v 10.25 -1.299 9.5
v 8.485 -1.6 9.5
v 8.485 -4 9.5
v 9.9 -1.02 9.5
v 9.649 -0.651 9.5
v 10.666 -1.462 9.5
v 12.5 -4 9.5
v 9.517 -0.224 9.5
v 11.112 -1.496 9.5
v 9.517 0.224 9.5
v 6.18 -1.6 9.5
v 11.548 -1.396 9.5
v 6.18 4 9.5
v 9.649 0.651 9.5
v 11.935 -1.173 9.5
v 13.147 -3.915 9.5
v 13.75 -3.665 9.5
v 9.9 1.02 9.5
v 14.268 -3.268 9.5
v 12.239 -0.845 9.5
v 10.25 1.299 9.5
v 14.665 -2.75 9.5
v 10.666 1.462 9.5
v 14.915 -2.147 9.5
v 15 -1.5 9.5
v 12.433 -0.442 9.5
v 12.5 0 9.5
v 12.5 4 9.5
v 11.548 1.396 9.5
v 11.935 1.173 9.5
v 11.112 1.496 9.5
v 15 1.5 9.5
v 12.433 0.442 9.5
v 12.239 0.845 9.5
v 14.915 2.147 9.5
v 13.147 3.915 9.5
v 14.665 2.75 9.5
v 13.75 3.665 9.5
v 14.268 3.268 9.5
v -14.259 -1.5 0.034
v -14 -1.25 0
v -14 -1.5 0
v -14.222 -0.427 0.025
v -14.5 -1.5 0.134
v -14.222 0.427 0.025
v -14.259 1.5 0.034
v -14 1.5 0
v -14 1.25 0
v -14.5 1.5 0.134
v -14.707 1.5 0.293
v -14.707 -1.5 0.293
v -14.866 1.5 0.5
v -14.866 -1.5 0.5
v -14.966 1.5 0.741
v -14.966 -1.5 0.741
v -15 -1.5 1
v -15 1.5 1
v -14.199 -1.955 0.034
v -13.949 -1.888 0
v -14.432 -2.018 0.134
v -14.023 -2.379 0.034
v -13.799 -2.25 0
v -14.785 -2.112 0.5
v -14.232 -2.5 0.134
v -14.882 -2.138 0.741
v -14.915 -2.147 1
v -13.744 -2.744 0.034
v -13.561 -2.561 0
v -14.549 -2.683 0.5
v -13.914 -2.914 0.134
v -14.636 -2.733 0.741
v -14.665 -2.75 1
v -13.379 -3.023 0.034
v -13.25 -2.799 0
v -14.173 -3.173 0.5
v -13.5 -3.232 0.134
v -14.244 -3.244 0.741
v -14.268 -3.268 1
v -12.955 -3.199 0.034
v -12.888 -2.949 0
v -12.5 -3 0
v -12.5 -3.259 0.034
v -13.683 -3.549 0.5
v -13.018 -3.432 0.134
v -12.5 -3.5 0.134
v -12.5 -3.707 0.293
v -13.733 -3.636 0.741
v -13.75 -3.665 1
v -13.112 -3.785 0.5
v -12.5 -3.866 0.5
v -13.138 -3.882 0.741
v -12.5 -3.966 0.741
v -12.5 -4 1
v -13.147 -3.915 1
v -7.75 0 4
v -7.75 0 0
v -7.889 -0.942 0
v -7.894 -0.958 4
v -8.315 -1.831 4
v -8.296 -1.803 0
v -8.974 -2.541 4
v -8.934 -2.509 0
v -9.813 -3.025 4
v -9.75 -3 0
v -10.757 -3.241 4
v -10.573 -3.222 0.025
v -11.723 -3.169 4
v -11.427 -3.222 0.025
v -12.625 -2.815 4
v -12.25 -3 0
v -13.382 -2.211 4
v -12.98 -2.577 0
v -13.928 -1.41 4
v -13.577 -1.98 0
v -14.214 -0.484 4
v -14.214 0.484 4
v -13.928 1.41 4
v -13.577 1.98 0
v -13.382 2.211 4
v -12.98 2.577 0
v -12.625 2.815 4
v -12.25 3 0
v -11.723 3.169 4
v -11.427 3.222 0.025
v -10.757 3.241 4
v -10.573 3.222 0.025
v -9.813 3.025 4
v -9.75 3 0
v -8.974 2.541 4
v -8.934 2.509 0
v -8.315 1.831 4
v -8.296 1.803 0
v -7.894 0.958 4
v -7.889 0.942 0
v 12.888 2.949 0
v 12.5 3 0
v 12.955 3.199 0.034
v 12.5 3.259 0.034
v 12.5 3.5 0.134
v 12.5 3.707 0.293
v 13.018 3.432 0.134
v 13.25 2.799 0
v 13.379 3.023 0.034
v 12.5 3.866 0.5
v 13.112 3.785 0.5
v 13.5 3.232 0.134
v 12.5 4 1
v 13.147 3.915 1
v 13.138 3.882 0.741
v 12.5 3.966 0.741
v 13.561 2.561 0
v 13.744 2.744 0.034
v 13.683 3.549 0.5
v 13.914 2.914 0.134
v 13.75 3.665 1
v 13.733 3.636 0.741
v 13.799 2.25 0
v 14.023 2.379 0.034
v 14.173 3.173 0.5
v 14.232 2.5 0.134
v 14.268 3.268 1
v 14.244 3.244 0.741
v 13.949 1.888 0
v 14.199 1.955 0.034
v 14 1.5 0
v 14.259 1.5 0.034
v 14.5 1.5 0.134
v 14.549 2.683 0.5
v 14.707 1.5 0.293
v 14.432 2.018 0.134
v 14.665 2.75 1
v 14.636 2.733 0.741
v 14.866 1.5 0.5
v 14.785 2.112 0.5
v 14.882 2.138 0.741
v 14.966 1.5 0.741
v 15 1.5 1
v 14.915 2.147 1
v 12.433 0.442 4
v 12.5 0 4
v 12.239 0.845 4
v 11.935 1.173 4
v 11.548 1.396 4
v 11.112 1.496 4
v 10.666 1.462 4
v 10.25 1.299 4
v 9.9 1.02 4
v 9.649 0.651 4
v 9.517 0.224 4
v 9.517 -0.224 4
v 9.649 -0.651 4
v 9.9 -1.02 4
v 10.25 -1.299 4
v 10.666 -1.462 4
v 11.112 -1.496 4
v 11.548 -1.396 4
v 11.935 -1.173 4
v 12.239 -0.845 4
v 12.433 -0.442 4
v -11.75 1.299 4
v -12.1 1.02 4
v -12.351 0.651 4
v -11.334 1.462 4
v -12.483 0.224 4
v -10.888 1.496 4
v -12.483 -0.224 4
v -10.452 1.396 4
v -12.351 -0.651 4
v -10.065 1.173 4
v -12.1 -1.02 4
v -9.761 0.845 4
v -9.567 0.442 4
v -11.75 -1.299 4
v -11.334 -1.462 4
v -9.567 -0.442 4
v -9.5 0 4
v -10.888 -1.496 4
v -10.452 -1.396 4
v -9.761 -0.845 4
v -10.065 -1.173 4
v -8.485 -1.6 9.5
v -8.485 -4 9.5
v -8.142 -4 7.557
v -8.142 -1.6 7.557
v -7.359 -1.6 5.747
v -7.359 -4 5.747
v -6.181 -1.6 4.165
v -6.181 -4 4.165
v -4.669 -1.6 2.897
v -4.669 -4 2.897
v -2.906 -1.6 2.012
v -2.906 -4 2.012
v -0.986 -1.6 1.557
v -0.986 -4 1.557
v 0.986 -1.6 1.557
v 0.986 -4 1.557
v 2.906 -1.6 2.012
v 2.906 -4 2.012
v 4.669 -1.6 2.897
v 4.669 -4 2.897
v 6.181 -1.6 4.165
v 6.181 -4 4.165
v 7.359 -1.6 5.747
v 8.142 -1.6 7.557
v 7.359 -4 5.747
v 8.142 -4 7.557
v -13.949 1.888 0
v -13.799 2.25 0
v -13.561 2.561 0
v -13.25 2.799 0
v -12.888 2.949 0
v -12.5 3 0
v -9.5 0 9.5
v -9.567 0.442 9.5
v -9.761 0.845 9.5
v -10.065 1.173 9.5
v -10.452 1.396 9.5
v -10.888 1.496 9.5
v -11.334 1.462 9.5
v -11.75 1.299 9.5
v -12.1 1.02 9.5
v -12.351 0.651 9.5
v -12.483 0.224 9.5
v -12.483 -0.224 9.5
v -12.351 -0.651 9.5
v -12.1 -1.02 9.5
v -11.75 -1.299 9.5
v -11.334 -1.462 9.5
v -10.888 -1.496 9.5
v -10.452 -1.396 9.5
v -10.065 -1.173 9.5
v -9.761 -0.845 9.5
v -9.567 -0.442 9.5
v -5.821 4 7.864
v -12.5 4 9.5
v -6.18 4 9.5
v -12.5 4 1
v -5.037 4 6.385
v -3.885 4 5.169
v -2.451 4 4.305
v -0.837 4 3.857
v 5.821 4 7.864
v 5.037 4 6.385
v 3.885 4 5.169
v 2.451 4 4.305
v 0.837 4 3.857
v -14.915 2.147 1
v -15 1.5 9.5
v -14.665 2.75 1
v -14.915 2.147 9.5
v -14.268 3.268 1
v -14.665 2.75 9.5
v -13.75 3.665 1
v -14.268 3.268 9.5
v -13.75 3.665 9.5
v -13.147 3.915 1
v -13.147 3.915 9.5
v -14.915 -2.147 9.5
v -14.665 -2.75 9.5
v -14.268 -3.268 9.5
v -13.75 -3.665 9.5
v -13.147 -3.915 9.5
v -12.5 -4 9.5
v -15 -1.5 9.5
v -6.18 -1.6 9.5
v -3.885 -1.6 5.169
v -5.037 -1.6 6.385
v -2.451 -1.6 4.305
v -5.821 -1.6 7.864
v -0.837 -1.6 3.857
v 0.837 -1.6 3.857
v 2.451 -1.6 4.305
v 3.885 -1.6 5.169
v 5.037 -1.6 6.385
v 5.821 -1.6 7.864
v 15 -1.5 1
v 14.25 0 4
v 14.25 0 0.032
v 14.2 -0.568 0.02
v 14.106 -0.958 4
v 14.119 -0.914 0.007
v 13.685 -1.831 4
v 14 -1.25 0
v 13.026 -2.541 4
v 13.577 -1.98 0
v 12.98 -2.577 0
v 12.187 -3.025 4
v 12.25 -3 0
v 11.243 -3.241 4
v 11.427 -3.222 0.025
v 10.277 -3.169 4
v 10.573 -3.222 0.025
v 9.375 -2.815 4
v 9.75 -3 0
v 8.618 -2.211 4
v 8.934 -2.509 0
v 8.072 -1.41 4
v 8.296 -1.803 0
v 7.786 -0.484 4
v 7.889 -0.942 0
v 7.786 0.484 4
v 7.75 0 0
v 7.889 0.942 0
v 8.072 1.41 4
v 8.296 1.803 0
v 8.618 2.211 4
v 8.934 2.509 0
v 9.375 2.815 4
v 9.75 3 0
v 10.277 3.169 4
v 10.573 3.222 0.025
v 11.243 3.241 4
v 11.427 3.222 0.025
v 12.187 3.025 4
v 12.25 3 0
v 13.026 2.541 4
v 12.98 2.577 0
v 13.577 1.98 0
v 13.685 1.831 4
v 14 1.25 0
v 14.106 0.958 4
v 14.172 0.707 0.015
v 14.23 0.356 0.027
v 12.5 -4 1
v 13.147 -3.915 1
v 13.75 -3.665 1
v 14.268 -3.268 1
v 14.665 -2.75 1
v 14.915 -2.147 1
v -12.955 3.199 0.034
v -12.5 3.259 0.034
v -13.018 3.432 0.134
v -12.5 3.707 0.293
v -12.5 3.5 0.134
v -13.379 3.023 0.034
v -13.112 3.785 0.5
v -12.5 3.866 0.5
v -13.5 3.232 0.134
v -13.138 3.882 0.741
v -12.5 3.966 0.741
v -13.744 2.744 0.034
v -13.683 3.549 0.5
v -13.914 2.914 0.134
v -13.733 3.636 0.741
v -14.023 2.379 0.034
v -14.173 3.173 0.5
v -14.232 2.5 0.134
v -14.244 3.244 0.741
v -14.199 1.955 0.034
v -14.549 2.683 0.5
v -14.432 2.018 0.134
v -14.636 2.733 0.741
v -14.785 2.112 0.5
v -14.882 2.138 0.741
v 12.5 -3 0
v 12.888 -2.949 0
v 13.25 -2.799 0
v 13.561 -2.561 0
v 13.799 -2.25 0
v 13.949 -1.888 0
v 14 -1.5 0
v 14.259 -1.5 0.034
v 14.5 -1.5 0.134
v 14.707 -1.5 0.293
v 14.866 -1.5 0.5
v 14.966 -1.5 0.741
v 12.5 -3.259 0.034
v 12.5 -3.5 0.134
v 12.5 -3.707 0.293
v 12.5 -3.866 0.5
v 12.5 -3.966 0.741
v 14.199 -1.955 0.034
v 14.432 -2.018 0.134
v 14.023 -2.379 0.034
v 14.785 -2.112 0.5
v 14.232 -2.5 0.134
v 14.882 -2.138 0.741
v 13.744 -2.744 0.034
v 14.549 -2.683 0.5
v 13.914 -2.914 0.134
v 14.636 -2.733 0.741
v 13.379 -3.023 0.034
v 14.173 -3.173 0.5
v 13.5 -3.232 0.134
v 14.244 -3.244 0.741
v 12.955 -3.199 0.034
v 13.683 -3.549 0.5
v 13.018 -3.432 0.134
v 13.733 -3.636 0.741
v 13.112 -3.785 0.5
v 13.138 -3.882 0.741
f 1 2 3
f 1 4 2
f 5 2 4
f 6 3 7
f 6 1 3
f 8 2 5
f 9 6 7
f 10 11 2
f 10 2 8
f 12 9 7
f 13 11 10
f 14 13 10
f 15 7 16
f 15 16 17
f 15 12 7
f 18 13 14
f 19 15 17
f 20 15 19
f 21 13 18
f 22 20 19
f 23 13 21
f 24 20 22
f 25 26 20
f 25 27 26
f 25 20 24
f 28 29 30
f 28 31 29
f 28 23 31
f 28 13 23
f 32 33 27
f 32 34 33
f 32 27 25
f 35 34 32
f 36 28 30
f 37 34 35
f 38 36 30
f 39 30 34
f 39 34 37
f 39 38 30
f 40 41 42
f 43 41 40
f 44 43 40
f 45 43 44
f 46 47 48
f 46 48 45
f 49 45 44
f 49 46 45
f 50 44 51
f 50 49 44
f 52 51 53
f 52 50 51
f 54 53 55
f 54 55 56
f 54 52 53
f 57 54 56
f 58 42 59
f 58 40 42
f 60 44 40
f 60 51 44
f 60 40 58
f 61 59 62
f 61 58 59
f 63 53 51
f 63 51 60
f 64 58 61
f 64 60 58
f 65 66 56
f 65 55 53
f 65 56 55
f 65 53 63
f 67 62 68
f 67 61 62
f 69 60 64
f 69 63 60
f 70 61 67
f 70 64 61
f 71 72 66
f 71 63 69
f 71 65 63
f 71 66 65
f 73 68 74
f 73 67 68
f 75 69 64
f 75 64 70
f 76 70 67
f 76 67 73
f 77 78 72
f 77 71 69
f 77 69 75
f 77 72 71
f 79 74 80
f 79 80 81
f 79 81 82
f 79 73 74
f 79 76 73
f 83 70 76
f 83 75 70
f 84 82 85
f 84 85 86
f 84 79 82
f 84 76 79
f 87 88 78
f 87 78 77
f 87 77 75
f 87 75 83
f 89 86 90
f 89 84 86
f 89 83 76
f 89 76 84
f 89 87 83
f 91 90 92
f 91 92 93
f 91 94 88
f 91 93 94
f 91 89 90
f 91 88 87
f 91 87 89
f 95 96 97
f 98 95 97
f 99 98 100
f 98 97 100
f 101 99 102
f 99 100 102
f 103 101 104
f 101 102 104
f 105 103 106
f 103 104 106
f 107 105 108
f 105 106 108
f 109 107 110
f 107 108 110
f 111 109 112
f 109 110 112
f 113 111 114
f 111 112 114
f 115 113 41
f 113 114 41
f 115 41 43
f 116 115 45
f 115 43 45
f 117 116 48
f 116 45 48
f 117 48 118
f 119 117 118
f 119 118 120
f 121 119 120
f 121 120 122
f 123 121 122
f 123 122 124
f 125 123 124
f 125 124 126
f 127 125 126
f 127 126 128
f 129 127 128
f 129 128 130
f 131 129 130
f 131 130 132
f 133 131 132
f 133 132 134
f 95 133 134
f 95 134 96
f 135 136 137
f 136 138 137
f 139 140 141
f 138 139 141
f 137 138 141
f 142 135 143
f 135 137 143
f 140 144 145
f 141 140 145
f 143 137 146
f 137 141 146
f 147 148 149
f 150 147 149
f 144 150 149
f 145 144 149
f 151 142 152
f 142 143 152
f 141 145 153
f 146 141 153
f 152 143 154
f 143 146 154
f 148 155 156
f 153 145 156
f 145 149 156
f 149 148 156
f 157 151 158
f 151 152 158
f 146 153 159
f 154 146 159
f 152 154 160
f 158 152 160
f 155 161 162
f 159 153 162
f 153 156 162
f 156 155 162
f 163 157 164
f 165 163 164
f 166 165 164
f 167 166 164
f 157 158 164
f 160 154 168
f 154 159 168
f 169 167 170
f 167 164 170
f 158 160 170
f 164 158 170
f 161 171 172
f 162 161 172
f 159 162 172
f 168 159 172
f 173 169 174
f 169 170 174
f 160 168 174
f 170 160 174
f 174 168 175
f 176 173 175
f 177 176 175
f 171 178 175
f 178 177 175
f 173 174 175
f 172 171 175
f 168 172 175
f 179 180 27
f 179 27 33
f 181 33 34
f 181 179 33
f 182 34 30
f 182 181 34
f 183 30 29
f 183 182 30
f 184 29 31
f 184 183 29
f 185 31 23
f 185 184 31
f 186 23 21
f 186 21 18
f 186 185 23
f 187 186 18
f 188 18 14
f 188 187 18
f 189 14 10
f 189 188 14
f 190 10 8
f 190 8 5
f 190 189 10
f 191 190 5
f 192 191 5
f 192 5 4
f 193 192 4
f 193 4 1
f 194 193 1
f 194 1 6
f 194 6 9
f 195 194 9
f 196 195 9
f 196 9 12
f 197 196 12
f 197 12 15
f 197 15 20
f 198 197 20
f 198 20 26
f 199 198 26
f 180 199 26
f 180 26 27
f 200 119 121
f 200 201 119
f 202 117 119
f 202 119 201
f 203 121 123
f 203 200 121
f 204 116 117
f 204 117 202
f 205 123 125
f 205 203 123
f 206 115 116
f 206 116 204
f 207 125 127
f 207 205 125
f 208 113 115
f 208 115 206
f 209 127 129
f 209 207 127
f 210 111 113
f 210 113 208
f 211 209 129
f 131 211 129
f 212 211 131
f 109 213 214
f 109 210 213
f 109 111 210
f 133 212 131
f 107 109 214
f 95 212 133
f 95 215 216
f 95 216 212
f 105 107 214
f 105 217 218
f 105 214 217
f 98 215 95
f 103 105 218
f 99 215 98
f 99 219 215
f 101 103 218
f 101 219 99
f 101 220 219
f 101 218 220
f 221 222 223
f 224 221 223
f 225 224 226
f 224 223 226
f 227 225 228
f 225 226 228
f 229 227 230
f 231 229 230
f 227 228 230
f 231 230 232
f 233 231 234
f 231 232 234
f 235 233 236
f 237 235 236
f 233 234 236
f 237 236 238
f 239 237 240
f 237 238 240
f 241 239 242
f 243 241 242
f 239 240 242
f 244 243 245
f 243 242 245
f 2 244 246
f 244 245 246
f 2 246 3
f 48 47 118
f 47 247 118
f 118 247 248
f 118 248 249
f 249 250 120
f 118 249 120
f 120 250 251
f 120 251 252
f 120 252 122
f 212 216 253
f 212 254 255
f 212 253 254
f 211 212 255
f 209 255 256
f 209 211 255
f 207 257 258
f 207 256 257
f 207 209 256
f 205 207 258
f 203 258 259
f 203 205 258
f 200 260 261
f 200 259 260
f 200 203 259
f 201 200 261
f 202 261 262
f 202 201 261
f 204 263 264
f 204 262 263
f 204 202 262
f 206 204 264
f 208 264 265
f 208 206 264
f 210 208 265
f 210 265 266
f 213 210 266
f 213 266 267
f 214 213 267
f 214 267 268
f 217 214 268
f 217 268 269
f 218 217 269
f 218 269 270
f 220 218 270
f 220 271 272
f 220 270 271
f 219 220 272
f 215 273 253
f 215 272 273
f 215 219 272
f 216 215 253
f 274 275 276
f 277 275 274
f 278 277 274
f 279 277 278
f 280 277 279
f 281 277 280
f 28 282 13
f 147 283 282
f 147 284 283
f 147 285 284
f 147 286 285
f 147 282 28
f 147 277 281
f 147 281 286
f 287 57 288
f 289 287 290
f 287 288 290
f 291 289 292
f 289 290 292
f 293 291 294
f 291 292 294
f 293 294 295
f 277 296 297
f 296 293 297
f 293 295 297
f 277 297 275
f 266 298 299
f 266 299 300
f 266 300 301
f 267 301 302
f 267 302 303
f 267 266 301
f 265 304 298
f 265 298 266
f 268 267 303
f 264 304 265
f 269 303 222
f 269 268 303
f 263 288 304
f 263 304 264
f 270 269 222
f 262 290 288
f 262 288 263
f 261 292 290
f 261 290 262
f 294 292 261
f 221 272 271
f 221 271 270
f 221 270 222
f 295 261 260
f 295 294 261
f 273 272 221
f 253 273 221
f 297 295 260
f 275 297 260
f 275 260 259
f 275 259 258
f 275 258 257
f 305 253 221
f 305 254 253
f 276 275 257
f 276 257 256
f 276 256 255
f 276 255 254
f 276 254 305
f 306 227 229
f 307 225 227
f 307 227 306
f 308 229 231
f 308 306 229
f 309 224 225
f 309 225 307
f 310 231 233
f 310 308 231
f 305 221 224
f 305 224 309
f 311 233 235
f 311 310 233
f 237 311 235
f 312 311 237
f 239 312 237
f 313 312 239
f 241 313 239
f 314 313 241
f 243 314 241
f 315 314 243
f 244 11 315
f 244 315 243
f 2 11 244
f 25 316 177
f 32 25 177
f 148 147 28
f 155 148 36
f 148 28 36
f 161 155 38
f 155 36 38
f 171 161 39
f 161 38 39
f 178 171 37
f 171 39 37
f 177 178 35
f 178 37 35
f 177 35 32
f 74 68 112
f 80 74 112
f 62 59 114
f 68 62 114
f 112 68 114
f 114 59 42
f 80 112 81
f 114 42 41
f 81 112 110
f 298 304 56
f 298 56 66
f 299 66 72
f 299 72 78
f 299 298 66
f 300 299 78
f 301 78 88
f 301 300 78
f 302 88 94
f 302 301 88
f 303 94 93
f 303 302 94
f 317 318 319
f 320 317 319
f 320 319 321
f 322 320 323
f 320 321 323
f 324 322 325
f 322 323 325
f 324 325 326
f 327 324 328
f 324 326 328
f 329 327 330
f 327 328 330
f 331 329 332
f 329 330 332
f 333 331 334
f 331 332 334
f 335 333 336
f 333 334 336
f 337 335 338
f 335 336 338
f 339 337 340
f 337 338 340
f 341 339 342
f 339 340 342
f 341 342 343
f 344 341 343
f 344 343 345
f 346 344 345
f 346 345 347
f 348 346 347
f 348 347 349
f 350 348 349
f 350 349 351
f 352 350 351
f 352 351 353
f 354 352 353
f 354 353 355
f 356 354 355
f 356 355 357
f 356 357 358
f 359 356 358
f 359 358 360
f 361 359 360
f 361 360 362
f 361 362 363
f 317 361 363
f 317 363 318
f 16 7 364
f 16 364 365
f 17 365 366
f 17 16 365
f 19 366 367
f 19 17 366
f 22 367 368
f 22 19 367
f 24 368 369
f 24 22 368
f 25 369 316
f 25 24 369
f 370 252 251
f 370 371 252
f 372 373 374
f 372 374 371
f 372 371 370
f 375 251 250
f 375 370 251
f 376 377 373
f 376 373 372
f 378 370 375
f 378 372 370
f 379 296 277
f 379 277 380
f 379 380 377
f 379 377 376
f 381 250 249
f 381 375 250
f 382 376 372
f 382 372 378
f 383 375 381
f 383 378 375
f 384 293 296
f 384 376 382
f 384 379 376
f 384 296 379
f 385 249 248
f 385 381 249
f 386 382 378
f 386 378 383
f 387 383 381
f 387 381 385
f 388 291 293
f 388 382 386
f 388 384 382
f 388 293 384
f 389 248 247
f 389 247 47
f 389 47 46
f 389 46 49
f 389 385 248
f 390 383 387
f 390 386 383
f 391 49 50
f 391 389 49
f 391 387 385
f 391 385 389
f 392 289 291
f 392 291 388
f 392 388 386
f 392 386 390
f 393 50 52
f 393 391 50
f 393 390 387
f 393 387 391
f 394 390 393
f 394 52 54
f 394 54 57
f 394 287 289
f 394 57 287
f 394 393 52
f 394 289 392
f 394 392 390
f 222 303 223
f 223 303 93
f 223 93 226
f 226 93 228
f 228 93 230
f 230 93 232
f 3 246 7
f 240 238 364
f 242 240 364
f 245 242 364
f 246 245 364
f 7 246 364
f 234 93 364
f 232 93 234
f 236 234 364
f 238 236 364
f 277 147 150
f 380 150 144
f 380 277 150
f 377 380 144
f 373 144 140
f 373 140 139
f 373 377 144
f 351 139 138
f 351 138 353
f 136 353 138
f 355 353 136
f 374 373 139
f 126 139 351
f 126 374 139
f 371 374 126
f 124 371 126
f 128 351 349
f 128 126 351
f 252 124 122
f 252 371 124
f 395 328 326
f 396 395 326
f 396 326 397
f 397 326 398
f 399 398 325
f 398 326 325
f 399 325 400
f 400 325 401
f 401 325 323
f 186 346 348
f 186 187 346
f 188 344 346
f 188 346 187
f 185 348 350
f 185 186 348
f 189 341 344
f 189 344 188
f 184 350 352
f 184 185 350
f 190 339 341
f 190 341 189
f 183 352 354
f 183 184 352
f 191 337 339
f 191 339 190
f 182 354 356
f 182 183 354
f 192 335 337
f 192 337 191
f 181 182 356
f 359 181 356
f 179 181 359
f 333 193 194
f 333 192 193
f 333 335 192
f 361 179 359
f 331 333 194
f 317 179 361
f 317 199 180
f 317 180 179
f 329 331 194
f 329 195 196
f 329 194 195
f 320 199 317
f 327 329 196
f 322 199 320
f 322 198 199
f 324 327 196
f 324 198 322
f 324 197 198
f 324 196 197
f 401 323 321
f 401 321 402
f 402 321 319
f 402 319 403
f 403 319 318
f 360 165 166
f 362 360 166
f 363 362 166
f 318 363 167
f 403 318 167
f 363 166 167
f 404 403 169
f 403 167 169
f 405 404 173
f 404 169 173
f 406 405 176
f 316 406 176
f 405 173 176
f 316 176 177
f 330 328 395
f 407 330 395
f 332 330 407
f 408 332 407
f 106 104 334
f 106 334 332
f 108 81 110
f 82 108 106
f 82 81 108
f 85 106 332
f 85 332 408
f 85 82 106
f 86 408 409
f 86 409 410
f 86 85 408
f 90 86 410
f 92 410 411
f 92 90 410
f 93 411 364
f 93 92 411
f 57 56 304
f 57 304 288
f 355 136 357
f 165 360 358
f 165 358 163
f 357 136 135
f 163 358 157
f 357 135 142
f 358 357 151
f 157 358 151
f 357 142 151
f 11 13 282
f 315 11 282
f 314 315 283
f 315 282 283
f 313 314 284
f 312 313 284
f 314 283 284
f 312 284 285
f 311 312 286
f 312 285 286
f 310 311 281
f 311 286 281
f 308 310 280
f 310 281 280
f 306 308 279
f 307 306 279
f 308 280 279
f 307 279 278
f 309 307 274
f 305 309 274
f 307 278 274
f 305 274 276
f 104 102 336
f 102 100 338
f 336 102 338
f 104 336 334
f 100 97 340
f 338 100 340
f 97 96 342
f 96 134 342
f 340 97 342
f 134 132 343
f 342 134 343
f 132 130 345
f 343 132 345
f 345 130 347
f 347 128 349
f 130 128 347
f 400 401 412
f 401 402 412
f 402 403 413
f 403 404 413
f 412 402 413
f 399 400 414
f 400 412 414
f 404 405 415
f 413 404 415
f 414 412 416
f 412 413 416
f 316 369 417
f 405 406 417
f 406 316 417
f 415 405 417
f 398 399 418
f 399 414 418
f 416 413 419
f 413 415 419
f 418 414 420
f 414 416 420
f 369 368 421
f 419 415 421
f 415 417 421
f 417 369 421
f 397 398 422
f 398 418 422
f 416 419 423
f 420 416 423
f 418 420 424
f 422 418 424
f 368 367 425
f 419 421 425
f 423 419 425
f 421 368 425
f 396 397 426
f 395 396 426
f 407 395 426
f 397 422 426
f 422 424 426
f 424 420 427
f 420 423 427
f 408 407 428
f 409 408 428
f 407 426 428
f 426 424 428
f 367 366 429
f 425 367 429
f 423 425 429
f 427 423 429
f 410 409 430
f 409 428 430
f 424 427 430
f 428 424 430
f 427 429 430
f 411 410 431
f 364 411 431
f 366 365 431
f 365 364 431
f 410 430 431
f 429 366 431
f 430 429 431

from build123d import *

# Parameters (mm, degrees)
F0_W         = 30
F0_H         = 8
F0_R         = 1.5
F1_DEPTH     = 10
F2_R         = 3.25
F2_R_2       = 1.5
F3_DEPTH     = 4
F5_DEPTH     = 8.001
F7_DEPTH     = 2.4
F8_R         = 2.5
F9_T1_DEPTH  = 3
F9_T3_DEPTH  = 25
F9_T6_ANGLE  = 90
F9_T8_ANGLE  = 90
F9_T10_ANGLE = 90
F9_T12_ANGLE = 90
F10_W        = 35.437501967
F10_H        = 11.6335232742
F10_R        = 1.5
F11_DEPTH    = 0.5


# Not quite as in the source:
# - a fillet or chamfer that OpenCascade refuses, or shapes differently, is made with other operations: its cross-section is extruded or revolved along the edge and cut away or added


with BuildPart() as f1:
    # F0 (on Top) → F1 (new body)
    with BuildSketch(Plane.XY):
        Rectangle(F0_W, F0_H)
        with Locations((-11, 0)):
            Circle(F0_R, mode=Mode.SUBTRACT)
        with Locations((11, 0)):
            Circle(F0_R, mode=Mode.SUBTRACT)
    extrude(amount=F1_DEPTH)

    # F2 (on face) → F3 (cut)
    with BuildSketch(Plane(origin=(0, 0, 0), x_dir=(1, 0, 0), z_dir=(0, 0, -1))):
        with Locations((11, 0)):
            Circle(F2_R)
        with Locations((11, 0)):
            Circle(F2_R_2, mode=Mode.SUBTRACT)
        with Locations((-11, 0)):
            Circle(F2_R)
        with Locations((-11, 0)):
            Circle(F2_R_2, mode=Mode.SUBTRACT)
    extrude(amount=-F3_DEPTH, mode=Mode.SUBTRACT)

    # F4 (on face) → F5 (cut, through all)
    with BuildSketch(Plane(origin=(0, 4, 0), x_dir=(-1, 0, 0), z_dir=(0, 1, 0))):
        with BuildLine():
            ThreePointArc((-6.2, 10), (0, 3.8), (6.2, 10))
            Line((6.2, 10), (-6.2, 10))
        make_face()
    extrude(amount=-F5_DEPTH, mode=Mode.SUBTRACT)

    # F6 (on face) → F7 (cut)
    with BuildSketch(Plane.XZ.offset(4)):
        with BuildLine():
            ThreePointArc((-8.5, 10), (0, 1.5), (8.5, 10))
            Line((8.5, 10), (6.2, 10))
            ThreePointArc((6.2, 10), (0, 3.8), (-6.2, 10))
            Line((-6.2, 10), (-8.5, 10))
        make_face()
    extrude(amount=-F7_DEPTH, mode=Mode.SUBTRACT)

    # F8
    f8_edges = [f1.edges().sort_by_distance(p)[0] for p in [
        (15, 4, 5),
        (15, -4, 5),
        (-15, 4, 5),
        (-15, -4, 5),
    ]]
    fillet(f8_edges, radius=F8_R)

    # F9: fillet of radius 1 on 8 edges, made by hand

    # F9_s2 → F9_t1 (cut)
    with BuildSketch(Plane.XZ.offset(-1.5)):
        with BuildLine():
            ThreePointArc((14, 0), (14.7071067812, 0.2928932188), (15, 1))
            Line((15, 1), (15, 0))
            Line((15, 0), (14, 0))
        make_face()
        with BuildLine():
            ThreePointArc((-14, 0), (-14.7071067812, 0.2928932188), (-15, 1))
            Line((-15, 1), (-15, 0))
            Line((-15, 0), (-14, 0))
        make_face()
    extrude(amount=F9_T1_DEPTH, mode=Mode.SUBTRACT)

    # F9_s4 → F9_t3 (cut)
    with BuildSketch(Plane.YZ.offset(-12.5)):
        with BuildLine():
            ThreePointArc((4, 1), (3.7071067812, 0.2928932188), (3, 0))
            Line((3, 0), (4, 0))
            Line((4, 0), (4, 1))
        make_face()
        with BuildLine():
            ThreePointArc((-3, 0), (-3.7071067812, 0.2928932188), (-4, 1))
            Line((-4, 1), (-4, 0))
            Line((-4, 0), (-3, 0))
        make_face()
    extrude(amount=F9_T3_DEPTH, mode=Mode.SUBTRACT)

    # F9_s5 → F9_t6 (revolve, cut)
    with BuildSketch(Plane.YZ.offset(12.5)):
        with BuildLine():
            ThreePointArc((3, 0), (3.7071067812, 0.2928932188), (4, 1))
            Line((4, 1), (4, 0))
            Line((4, 0), (3, 0))
        make_face()
    revolve(axis=Axis((12.5, 1.5, 0), (0, 0, -1)), revolution_arc=F9_T6_ANGLE, mode=Mode.SUBTRACT)

    # F9_s7 → F9_t8 (revolve, cut)
    with BuildSketch(Plane.YZ.offset(-12.5)):
        with BuildLine():
            ThreePointArc((3, 0), (3.7071067812, 0.2928932188), (4, 1))
            Line((4, 1), (4, 0))
            Line((4, 0), (3, 0))
        make_face()
    revolve(axis=Axis((-12.5, 1.5, 0), (0, 0, 1)), revolution_arc=F9_T8_ANGLE, mode=Mode.SUBTRACT)

    # F9_s9 → F9_t10 (revolve, cut)
    with BuildSketch(Plane.XZ.offset(1.5)):
        with BuildLine():
            ThreePointArc((14, 0), (14.7071067812, 0.2928932188), (15, 1))
            Line((15, 1), (15, 0))
            Line((15, 0), (14, 0))
        make_face()
    revolve(axis=Axis((12.5, -1.5, 0), (0, 0, -1)), revolution_arc=F9_T10_ANGLE, mode=Mode.SUBTRACT)

    # F9_s11 → F9_t12 (revolve, cut)
    with BuildSketch(Plane.XZ.offset(1.5)):
        with BuildLine():
            ThreePointArc((-14, 0), (-14.7071067812, 0.2928932188), (-15, 1))
            Line((-15, 1), (-15, 0))
            Line((-15, 0), (-14, 0))
        make_face()
    revolve(axis=Axis((-12.5, -1.5, 0), (0, 0, 1)), revolution_arc=F9_T12_ANGLE, mode=Mode.SUBTRACT)

    # F10 (on face) → F11 (cut)
    with BuildSketch(Plane.XY.offset(10)):
        with Locations((0.726422295, -0.4176155198)):
            Rectangle(F10_W, F10_H)
        with BuildLine():
            Line((12.5, -4), (8.5, -4))
            Line((8.5, -4), (8.5, -1.6))
            Line((8.5, -1.6), (6.2, -1.6))
            Line((6.2, -1.6), (6.2, 4))
            Line((6.2, 4), (12.5, 4))
            ThreePointArc((12.5, 4), (14.267766953, 3.267766953), (15, 1.5))
            Line((15, 1.5), (15, -1.5))
            ThreePointArc((15, -1.5), (14.267766953, -3.267766953), (12.5, -4))
        make_face(mode=Mode.SUBTRACT)
        with BuildLine():
            Line((8.5, -1.6), (8.5, -4))
            Line((8.5, -4), (12.5, -4))
            ThreePointArc((12.5, -4), (14.267766953, -3.267766953), (15, -1.5))
            Line((15, -1.5), (15, 1.5))
            ThreePointArc((15, 1.5), (14.267766953, 3.267766953), (12.5, 4))
            Line((12.5, 4), (6.2, 4))
            Line((6.2, 4), (6.2, -1.6))
            Line((6.2, -1.6), (8.5, -1.6))
        make_face()
        with Locations((11, 0)):
            Circle(F10_R, mode=Mode.SUBTRACT)
    extrude(amount=-F11_DEPTH, mode=Mode.SUBTRACT)


solid = f1.part
